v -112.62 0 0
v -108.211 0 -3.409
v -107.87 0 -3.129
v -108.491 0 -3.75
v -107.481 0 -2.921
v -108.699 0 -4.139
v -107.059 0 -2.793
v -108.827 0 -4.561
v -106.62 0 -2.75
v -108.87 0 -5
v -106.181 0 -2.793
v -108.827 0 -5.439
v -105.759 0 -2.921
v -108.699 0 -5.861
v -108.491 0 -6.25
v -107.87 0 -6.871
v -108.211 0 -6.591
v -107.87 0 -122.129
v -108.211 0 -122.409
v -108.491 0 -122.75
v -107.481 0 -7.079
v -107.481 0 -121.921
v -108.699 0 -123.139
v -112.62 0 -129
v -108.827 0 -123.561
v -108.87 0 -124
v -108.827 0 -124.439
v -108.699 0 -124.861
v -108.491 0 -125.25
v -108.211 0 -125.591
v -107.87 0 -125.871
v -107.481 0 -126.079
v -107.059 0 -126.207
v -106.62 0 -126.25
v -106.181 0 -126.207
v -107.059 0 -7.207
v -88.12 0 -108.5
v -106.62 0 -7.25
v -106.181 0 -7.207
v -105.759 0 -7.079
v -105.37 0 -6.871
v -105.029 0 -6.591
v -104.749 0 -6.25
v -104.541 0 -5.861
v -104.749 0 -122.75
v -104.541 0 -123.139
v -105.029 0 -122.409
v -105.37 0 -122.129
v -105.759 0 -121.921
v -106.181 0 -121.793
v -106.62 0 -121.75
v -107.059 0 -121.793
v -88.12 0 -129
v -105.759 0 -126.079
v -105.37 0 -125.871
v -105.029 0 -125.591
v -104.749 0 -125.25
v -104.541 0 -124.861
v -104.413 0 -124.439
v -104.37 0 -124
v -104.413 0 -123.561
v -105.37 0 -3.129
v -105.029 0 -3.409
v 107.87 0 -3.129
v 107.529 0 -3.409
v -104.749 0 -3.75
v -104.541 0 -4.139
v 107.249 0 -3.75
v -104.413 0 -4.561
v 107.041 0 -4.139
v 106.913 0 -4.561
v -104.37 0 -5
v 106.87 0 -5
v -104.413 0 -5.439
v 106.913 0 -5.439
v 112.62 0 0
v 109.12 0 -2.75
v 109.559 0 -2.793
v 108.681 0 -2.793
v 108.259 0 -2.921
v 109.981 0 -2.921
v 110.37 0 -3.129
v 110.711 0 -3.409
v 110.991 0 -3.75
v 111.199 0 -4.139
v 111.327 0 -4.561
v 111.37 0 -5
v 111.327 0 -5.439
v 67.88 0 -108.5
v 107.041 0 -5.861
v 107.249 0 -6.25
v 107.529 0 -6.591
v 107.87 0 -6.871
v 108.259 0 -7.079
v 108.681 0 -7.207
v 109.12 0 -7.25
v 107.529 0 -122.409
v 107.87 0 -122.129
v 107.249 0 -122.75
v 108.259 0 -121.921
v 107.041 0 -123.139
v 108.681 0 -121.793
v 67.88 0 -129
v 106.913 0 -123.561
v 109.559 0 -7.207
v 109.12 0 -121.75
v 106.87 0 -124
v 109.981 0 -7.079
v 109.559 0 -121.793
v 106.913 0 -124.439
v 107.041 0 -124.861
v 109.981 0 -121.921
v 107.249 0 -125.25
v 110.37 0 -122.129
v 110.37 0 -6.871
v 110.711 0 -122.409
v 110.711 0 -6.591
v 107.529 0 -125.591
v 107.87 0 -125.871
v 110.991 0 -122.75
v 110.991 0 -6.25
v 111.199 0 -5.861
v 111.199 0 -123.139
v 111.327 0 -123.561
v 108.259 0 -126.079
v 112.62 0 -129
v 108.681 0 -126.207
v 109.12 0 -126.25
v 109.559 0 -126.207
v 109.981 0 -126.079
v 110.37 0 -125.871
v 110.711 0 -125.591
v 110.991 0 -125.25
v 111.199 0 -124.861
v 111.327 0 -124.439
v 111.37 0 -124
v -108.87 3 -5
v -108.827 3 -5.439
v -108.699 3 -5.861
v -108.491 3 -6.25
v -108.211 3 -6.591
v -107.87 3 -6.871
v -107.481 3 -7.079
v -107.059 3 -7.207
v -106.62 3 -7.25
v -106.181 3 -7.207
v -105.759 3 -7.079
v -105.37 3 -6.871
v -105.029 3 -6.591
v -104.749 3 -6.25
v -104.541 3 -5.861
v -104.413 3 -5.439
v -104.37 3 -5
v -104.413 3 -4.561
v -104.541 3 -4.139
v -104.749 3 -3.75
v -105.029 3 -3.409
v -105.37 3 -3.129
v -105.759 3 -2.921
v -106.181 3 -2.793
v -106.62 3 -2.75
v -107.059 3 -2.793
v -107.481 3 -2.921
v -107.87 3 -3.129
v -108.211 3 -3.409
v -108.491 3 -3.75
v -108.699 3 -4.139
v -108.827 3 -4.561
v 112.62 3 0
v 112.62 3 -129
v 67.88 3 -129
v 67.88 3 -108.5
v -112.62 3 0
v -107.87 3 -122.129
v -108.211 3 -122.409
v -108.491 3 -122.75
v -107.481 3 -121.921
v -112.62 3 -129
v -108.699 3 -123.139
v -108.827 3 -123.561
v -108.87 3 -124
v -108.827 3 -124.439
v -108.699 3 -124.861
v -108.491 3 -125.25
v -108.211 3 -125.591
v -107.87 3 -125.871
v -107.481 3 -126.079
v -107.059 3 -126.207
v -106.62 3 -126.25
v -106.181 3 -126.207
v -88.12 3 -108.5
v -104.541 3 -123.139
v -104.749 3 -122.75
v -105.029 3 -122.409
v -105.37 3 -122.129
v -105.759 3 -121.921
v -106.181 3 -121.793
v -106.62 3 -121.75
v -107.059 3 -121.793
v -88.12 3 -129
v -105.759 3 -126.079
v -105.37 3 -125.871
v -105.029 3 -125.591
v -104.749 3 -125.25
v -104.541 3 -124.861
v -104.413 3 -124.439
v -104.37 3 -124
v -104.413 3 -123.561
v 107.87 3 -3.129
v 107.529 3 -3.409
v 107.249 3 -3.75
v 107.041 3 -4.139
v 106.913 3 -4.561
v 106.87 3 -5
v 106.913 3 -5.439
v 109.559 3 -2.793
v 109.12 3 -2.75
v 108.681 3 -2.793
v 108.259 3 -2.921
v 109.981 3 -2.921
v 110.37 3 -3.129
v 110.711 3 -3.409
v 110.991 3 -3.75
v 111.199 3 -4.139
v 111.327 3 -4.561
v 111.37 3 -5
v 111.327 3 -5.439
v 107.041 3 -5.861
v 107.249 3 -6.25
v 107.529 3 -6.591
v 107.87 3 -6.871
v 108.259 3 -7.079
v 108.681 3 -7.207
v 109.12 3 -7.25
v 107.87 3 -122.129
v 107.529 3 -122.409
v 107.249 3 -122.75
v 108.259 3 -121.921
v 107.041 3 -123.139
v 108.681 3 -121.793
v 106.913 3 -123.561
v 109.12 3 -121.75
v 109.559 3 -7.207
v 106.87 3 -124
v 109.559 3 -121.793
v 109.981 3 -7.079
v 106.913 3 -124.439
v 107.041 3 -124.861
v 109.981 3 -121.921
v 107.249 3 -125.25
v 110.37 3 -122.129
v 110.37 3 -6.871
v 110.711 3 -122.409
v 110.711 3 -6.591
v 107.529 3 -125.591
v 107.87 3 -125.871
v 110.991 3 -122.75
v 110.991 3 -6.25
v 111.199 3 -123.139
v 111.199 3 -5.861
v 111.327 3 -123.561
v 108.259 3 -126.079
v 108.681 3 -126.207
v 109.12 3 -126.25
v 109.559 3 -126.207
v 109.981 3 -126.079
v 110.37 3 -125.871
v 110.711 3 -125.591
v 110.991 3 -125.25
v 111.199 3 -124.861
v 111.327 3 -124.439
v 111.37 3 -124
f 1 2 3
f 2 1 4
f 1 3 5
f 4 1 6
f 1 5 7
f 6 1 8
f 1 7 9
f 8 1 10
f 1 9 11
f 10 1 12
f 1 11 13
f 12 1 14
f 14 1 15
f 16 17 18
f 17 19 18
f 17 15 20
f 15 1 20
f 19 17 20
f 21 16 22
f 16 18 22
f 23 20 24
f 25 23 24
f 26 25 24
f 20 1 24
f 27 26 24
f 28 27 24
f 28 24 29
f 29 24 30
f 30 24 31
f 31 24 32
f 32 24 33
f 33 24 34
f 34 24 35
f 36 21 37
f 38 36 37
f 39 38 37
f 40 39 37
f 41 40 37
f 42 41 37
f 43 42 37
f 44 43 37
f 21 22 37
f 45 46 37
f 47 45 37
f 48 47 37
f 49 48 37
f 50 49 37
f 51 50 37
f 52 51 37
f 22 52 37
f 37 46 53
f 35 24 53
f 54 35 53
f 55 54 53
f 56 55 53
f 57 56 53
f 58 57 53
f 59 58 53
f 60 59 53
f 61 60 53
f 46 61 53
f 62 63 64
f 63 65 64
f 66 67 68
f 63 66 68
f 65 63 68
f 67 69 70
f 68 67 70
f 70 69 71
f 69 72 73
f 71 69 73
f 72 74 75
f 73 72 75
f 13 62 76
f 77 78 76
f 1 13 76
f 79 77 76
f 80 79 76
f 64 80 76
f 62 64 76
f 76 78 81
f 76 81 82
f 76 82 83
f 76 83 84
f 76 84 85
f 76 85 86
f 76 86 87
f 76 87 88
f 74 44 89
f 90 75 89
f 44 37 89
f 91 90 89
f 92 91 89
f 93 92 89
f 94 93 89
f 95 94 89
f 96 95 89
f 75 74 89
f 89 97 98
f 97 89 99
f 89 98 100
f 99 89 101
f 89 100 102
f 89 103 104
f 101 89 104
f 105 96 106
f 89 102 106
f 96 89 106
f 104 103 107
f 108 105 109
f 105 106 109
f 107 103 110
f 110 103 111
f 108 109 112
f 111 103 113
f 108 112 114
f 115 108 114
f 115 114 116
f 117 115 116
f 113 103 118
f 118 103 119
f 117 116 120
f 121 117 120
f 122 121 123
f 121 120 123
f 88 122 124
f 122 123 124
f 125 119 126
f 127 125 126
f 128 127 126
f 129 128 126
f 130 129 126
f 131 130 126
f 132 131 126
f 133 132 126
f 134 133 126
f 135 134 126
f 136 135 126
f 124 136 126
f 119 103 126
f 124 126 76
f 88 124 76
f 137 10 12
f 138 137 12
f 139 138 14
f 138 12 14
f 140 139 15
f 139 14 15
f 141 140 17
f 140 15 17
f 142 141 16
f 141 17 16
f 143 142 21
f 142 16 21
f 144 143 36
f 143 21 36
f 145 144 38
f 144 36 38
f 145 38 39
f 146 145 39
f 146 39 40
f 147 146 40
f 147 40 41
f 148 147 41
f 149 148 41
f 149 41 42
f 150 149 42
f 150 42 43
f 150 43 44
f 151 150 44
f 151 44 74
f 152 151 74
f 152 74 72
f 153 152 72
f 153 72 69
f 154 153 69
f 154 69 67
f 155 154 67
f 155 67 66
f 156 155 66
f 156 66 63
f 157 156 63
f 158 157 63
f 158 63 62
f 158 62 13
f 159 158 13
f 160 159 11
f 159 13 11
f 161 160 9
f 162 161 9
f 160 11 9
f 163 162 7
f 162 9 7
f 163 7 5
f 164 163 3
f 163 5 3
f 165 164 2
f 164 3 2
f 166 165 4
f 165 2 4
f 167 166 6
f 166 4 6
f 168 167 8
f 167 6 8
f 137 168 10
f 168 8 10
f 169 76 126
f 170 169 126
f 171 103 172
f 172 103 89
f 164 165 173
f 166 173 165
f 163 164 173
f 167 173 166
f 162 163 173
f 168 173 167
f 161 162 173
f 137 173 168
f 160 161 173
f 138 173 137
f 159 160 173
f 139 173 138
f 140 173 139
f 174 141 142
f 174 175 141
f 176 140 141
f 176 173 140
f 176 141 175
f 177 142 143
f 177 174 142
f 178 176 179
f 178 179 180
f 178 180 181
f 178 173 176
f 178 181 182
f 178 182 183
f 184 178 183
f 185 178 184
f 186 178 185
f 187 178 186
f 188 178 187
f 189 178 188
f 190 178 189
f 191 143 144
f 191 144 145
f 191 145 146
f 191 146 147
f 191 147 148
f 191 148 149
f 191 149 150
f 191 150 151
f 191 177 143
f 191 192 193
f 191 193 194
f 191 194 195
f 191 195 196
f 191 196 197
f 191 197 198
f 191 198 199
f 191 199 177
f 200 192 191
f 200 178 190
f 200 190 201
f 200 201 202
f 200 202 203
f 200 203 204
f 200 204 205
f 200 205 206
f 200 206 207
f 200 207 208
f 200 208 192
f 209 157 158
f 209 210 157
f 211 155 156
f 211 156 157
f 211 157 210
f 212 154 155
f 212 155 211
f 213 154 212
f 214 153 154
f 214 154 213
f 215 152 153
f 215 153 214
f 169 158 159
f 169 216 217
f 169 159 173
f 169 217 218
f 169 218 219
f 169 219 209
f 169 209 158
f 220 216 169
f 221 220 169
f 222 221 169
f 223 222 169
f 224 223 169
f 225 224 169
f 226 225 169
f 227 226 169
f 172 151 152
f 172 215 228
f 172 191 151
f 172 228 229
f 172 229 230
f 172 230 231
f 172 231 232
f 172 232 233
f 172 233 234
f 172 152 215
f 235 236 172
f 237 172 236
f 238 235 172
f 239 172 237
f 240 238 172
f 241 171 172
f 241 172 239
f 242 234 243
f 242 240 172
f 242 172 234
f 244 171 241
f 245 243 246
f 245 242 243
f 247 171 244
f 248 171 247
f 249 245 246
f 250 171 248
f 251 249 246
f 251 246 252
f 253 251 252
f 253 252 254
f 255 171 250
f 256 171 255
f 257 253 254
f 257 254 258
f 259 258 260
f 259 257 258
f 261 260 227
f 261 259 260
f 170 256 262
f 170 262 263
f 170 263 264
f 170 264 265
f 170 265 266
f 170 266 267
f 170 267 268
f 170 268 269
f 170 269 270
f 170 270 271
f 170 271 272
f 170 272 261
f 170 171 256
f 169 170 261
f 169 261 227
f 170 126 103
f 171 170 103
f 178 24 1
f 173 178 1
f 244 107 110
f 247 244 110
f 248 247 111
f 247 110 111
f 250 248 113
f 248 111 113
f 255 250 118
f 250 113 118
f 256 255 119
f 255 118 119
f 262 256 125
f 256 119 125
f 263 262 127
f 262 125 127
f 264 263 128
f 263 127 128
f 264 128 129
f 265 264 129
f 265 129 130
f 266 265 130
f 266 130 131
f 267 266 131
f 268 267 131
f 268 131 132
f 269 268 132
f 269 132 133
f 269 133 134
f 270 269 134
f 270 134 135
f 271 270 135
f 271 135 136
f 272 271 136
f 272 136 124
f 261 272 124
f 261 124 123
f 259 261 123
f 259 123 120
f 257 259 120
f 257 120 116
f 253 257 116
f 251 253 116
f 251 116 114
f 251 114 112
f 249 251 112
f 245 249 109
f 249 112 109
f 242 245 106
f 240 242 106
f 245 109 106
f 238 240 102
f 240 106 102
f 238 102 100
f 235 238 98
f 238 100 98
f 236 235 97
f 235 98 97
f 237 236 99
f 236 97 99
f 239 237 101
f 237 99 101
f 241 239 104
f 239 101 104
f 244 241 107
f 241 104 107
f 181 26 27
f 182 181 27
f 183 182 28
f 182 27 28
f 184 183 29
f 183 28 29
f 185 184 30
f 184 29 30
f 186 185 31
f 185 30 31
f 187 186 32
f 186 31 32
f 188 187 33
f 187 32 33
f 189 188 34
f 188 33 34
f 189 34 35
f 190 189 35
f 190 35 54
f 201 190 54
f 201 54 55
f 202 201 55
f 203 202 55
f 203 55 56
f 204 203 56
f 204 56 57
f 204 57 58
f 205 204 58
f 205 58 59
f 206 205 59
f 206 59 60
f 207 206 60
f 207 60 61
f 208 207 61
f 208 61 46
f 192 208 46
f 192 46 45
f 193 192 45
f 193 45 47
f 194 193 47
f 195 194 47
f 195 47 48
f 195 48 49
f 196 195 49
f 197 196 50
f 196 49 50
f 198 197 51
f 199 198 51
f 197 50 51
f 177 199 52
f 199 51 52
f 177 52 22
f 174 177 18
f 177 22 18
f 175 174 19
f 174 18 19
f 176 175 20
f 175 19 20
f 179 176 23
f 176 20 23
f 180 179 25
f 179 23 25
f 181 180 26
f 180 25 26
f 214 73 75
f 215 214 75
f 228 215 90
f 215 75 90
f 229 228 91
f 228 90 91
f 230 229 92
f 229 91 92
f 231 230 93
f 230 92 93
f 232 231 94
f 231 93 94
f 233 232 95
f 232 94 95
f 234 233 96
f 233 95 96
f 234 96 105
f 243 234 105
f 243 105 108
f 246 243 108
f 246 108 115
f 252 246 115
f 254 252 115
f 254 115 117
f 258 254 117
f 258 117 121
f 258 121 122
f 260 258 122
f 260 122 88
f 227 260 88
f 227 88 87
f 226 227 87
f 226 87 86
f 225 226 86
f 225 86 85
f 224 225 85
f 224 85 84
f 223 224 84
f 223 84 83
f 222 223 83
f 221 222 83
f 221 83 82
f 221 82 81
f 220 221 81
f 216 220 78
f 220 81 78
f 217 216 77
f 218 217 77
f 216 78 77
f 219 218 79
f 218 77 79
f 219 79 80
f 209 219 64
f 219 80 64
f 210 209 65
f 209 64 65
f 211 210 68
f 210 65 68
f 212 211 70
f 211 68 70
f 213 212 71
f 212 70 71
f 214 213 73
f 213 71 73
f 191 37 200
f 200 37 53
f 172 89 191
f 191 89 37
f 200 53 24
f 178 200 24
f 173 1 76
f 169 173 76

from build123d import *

# Parameters (mm, degrees)
BOSS_EXTRUDE1_DEPTH      = 3
M4_CLEARANCE_HOLE1_D     = 4.5
M4_CLEARANCE_HOLE1_DEPTH = 12
M4_CLEARANCE_HOLE1_TIP   = 1.351936393


with BuildPart() as part:
    # Sketch1 → Boss-Extrude1 (new body)
    with BuildSketch(Plane(origin=(0, 0, 0), x_dir=(1, 0, 0), z_dir=(0, 1, 0))):
        Polygon((-112.62, 129), (-112.62, 0), (112.62, 0), (112.62, 129), (67.88, 129), (67.88, 108.5), (-88.12, 108.5), (-88.12, 129), align=None)
    extrude(amount=BOSS_EXTRUDE1_DEPTH)

    # M4 Clearance Hole1
    with Locations(Plane(origin=(0, 3, 0), x_dir=(1, 0, 0), z_dir=(0, 1, 0))):
        with Locations((-106.62, 5), (-106.62, 124), (109.12, 124), (109.12, 5)):
            Hole(M4_CLEARANCE_HOLE1_D / 2, depth=M4_CLEARANCE_HOLE1_DEPTH)
            with Locations((0, 0, -(M4_CLEARANCE_HOLE1_DEPTH + M4_CLEARANCE_HOLE1_TIP / 2))):  # 118° drill point
                Cone(0, M4_CLEARANCE_HOLE1_D / 2, M4_CLEARANCE_HOLE1_TIP, mode=Mode.SUBTRACT)


solid = part.part
